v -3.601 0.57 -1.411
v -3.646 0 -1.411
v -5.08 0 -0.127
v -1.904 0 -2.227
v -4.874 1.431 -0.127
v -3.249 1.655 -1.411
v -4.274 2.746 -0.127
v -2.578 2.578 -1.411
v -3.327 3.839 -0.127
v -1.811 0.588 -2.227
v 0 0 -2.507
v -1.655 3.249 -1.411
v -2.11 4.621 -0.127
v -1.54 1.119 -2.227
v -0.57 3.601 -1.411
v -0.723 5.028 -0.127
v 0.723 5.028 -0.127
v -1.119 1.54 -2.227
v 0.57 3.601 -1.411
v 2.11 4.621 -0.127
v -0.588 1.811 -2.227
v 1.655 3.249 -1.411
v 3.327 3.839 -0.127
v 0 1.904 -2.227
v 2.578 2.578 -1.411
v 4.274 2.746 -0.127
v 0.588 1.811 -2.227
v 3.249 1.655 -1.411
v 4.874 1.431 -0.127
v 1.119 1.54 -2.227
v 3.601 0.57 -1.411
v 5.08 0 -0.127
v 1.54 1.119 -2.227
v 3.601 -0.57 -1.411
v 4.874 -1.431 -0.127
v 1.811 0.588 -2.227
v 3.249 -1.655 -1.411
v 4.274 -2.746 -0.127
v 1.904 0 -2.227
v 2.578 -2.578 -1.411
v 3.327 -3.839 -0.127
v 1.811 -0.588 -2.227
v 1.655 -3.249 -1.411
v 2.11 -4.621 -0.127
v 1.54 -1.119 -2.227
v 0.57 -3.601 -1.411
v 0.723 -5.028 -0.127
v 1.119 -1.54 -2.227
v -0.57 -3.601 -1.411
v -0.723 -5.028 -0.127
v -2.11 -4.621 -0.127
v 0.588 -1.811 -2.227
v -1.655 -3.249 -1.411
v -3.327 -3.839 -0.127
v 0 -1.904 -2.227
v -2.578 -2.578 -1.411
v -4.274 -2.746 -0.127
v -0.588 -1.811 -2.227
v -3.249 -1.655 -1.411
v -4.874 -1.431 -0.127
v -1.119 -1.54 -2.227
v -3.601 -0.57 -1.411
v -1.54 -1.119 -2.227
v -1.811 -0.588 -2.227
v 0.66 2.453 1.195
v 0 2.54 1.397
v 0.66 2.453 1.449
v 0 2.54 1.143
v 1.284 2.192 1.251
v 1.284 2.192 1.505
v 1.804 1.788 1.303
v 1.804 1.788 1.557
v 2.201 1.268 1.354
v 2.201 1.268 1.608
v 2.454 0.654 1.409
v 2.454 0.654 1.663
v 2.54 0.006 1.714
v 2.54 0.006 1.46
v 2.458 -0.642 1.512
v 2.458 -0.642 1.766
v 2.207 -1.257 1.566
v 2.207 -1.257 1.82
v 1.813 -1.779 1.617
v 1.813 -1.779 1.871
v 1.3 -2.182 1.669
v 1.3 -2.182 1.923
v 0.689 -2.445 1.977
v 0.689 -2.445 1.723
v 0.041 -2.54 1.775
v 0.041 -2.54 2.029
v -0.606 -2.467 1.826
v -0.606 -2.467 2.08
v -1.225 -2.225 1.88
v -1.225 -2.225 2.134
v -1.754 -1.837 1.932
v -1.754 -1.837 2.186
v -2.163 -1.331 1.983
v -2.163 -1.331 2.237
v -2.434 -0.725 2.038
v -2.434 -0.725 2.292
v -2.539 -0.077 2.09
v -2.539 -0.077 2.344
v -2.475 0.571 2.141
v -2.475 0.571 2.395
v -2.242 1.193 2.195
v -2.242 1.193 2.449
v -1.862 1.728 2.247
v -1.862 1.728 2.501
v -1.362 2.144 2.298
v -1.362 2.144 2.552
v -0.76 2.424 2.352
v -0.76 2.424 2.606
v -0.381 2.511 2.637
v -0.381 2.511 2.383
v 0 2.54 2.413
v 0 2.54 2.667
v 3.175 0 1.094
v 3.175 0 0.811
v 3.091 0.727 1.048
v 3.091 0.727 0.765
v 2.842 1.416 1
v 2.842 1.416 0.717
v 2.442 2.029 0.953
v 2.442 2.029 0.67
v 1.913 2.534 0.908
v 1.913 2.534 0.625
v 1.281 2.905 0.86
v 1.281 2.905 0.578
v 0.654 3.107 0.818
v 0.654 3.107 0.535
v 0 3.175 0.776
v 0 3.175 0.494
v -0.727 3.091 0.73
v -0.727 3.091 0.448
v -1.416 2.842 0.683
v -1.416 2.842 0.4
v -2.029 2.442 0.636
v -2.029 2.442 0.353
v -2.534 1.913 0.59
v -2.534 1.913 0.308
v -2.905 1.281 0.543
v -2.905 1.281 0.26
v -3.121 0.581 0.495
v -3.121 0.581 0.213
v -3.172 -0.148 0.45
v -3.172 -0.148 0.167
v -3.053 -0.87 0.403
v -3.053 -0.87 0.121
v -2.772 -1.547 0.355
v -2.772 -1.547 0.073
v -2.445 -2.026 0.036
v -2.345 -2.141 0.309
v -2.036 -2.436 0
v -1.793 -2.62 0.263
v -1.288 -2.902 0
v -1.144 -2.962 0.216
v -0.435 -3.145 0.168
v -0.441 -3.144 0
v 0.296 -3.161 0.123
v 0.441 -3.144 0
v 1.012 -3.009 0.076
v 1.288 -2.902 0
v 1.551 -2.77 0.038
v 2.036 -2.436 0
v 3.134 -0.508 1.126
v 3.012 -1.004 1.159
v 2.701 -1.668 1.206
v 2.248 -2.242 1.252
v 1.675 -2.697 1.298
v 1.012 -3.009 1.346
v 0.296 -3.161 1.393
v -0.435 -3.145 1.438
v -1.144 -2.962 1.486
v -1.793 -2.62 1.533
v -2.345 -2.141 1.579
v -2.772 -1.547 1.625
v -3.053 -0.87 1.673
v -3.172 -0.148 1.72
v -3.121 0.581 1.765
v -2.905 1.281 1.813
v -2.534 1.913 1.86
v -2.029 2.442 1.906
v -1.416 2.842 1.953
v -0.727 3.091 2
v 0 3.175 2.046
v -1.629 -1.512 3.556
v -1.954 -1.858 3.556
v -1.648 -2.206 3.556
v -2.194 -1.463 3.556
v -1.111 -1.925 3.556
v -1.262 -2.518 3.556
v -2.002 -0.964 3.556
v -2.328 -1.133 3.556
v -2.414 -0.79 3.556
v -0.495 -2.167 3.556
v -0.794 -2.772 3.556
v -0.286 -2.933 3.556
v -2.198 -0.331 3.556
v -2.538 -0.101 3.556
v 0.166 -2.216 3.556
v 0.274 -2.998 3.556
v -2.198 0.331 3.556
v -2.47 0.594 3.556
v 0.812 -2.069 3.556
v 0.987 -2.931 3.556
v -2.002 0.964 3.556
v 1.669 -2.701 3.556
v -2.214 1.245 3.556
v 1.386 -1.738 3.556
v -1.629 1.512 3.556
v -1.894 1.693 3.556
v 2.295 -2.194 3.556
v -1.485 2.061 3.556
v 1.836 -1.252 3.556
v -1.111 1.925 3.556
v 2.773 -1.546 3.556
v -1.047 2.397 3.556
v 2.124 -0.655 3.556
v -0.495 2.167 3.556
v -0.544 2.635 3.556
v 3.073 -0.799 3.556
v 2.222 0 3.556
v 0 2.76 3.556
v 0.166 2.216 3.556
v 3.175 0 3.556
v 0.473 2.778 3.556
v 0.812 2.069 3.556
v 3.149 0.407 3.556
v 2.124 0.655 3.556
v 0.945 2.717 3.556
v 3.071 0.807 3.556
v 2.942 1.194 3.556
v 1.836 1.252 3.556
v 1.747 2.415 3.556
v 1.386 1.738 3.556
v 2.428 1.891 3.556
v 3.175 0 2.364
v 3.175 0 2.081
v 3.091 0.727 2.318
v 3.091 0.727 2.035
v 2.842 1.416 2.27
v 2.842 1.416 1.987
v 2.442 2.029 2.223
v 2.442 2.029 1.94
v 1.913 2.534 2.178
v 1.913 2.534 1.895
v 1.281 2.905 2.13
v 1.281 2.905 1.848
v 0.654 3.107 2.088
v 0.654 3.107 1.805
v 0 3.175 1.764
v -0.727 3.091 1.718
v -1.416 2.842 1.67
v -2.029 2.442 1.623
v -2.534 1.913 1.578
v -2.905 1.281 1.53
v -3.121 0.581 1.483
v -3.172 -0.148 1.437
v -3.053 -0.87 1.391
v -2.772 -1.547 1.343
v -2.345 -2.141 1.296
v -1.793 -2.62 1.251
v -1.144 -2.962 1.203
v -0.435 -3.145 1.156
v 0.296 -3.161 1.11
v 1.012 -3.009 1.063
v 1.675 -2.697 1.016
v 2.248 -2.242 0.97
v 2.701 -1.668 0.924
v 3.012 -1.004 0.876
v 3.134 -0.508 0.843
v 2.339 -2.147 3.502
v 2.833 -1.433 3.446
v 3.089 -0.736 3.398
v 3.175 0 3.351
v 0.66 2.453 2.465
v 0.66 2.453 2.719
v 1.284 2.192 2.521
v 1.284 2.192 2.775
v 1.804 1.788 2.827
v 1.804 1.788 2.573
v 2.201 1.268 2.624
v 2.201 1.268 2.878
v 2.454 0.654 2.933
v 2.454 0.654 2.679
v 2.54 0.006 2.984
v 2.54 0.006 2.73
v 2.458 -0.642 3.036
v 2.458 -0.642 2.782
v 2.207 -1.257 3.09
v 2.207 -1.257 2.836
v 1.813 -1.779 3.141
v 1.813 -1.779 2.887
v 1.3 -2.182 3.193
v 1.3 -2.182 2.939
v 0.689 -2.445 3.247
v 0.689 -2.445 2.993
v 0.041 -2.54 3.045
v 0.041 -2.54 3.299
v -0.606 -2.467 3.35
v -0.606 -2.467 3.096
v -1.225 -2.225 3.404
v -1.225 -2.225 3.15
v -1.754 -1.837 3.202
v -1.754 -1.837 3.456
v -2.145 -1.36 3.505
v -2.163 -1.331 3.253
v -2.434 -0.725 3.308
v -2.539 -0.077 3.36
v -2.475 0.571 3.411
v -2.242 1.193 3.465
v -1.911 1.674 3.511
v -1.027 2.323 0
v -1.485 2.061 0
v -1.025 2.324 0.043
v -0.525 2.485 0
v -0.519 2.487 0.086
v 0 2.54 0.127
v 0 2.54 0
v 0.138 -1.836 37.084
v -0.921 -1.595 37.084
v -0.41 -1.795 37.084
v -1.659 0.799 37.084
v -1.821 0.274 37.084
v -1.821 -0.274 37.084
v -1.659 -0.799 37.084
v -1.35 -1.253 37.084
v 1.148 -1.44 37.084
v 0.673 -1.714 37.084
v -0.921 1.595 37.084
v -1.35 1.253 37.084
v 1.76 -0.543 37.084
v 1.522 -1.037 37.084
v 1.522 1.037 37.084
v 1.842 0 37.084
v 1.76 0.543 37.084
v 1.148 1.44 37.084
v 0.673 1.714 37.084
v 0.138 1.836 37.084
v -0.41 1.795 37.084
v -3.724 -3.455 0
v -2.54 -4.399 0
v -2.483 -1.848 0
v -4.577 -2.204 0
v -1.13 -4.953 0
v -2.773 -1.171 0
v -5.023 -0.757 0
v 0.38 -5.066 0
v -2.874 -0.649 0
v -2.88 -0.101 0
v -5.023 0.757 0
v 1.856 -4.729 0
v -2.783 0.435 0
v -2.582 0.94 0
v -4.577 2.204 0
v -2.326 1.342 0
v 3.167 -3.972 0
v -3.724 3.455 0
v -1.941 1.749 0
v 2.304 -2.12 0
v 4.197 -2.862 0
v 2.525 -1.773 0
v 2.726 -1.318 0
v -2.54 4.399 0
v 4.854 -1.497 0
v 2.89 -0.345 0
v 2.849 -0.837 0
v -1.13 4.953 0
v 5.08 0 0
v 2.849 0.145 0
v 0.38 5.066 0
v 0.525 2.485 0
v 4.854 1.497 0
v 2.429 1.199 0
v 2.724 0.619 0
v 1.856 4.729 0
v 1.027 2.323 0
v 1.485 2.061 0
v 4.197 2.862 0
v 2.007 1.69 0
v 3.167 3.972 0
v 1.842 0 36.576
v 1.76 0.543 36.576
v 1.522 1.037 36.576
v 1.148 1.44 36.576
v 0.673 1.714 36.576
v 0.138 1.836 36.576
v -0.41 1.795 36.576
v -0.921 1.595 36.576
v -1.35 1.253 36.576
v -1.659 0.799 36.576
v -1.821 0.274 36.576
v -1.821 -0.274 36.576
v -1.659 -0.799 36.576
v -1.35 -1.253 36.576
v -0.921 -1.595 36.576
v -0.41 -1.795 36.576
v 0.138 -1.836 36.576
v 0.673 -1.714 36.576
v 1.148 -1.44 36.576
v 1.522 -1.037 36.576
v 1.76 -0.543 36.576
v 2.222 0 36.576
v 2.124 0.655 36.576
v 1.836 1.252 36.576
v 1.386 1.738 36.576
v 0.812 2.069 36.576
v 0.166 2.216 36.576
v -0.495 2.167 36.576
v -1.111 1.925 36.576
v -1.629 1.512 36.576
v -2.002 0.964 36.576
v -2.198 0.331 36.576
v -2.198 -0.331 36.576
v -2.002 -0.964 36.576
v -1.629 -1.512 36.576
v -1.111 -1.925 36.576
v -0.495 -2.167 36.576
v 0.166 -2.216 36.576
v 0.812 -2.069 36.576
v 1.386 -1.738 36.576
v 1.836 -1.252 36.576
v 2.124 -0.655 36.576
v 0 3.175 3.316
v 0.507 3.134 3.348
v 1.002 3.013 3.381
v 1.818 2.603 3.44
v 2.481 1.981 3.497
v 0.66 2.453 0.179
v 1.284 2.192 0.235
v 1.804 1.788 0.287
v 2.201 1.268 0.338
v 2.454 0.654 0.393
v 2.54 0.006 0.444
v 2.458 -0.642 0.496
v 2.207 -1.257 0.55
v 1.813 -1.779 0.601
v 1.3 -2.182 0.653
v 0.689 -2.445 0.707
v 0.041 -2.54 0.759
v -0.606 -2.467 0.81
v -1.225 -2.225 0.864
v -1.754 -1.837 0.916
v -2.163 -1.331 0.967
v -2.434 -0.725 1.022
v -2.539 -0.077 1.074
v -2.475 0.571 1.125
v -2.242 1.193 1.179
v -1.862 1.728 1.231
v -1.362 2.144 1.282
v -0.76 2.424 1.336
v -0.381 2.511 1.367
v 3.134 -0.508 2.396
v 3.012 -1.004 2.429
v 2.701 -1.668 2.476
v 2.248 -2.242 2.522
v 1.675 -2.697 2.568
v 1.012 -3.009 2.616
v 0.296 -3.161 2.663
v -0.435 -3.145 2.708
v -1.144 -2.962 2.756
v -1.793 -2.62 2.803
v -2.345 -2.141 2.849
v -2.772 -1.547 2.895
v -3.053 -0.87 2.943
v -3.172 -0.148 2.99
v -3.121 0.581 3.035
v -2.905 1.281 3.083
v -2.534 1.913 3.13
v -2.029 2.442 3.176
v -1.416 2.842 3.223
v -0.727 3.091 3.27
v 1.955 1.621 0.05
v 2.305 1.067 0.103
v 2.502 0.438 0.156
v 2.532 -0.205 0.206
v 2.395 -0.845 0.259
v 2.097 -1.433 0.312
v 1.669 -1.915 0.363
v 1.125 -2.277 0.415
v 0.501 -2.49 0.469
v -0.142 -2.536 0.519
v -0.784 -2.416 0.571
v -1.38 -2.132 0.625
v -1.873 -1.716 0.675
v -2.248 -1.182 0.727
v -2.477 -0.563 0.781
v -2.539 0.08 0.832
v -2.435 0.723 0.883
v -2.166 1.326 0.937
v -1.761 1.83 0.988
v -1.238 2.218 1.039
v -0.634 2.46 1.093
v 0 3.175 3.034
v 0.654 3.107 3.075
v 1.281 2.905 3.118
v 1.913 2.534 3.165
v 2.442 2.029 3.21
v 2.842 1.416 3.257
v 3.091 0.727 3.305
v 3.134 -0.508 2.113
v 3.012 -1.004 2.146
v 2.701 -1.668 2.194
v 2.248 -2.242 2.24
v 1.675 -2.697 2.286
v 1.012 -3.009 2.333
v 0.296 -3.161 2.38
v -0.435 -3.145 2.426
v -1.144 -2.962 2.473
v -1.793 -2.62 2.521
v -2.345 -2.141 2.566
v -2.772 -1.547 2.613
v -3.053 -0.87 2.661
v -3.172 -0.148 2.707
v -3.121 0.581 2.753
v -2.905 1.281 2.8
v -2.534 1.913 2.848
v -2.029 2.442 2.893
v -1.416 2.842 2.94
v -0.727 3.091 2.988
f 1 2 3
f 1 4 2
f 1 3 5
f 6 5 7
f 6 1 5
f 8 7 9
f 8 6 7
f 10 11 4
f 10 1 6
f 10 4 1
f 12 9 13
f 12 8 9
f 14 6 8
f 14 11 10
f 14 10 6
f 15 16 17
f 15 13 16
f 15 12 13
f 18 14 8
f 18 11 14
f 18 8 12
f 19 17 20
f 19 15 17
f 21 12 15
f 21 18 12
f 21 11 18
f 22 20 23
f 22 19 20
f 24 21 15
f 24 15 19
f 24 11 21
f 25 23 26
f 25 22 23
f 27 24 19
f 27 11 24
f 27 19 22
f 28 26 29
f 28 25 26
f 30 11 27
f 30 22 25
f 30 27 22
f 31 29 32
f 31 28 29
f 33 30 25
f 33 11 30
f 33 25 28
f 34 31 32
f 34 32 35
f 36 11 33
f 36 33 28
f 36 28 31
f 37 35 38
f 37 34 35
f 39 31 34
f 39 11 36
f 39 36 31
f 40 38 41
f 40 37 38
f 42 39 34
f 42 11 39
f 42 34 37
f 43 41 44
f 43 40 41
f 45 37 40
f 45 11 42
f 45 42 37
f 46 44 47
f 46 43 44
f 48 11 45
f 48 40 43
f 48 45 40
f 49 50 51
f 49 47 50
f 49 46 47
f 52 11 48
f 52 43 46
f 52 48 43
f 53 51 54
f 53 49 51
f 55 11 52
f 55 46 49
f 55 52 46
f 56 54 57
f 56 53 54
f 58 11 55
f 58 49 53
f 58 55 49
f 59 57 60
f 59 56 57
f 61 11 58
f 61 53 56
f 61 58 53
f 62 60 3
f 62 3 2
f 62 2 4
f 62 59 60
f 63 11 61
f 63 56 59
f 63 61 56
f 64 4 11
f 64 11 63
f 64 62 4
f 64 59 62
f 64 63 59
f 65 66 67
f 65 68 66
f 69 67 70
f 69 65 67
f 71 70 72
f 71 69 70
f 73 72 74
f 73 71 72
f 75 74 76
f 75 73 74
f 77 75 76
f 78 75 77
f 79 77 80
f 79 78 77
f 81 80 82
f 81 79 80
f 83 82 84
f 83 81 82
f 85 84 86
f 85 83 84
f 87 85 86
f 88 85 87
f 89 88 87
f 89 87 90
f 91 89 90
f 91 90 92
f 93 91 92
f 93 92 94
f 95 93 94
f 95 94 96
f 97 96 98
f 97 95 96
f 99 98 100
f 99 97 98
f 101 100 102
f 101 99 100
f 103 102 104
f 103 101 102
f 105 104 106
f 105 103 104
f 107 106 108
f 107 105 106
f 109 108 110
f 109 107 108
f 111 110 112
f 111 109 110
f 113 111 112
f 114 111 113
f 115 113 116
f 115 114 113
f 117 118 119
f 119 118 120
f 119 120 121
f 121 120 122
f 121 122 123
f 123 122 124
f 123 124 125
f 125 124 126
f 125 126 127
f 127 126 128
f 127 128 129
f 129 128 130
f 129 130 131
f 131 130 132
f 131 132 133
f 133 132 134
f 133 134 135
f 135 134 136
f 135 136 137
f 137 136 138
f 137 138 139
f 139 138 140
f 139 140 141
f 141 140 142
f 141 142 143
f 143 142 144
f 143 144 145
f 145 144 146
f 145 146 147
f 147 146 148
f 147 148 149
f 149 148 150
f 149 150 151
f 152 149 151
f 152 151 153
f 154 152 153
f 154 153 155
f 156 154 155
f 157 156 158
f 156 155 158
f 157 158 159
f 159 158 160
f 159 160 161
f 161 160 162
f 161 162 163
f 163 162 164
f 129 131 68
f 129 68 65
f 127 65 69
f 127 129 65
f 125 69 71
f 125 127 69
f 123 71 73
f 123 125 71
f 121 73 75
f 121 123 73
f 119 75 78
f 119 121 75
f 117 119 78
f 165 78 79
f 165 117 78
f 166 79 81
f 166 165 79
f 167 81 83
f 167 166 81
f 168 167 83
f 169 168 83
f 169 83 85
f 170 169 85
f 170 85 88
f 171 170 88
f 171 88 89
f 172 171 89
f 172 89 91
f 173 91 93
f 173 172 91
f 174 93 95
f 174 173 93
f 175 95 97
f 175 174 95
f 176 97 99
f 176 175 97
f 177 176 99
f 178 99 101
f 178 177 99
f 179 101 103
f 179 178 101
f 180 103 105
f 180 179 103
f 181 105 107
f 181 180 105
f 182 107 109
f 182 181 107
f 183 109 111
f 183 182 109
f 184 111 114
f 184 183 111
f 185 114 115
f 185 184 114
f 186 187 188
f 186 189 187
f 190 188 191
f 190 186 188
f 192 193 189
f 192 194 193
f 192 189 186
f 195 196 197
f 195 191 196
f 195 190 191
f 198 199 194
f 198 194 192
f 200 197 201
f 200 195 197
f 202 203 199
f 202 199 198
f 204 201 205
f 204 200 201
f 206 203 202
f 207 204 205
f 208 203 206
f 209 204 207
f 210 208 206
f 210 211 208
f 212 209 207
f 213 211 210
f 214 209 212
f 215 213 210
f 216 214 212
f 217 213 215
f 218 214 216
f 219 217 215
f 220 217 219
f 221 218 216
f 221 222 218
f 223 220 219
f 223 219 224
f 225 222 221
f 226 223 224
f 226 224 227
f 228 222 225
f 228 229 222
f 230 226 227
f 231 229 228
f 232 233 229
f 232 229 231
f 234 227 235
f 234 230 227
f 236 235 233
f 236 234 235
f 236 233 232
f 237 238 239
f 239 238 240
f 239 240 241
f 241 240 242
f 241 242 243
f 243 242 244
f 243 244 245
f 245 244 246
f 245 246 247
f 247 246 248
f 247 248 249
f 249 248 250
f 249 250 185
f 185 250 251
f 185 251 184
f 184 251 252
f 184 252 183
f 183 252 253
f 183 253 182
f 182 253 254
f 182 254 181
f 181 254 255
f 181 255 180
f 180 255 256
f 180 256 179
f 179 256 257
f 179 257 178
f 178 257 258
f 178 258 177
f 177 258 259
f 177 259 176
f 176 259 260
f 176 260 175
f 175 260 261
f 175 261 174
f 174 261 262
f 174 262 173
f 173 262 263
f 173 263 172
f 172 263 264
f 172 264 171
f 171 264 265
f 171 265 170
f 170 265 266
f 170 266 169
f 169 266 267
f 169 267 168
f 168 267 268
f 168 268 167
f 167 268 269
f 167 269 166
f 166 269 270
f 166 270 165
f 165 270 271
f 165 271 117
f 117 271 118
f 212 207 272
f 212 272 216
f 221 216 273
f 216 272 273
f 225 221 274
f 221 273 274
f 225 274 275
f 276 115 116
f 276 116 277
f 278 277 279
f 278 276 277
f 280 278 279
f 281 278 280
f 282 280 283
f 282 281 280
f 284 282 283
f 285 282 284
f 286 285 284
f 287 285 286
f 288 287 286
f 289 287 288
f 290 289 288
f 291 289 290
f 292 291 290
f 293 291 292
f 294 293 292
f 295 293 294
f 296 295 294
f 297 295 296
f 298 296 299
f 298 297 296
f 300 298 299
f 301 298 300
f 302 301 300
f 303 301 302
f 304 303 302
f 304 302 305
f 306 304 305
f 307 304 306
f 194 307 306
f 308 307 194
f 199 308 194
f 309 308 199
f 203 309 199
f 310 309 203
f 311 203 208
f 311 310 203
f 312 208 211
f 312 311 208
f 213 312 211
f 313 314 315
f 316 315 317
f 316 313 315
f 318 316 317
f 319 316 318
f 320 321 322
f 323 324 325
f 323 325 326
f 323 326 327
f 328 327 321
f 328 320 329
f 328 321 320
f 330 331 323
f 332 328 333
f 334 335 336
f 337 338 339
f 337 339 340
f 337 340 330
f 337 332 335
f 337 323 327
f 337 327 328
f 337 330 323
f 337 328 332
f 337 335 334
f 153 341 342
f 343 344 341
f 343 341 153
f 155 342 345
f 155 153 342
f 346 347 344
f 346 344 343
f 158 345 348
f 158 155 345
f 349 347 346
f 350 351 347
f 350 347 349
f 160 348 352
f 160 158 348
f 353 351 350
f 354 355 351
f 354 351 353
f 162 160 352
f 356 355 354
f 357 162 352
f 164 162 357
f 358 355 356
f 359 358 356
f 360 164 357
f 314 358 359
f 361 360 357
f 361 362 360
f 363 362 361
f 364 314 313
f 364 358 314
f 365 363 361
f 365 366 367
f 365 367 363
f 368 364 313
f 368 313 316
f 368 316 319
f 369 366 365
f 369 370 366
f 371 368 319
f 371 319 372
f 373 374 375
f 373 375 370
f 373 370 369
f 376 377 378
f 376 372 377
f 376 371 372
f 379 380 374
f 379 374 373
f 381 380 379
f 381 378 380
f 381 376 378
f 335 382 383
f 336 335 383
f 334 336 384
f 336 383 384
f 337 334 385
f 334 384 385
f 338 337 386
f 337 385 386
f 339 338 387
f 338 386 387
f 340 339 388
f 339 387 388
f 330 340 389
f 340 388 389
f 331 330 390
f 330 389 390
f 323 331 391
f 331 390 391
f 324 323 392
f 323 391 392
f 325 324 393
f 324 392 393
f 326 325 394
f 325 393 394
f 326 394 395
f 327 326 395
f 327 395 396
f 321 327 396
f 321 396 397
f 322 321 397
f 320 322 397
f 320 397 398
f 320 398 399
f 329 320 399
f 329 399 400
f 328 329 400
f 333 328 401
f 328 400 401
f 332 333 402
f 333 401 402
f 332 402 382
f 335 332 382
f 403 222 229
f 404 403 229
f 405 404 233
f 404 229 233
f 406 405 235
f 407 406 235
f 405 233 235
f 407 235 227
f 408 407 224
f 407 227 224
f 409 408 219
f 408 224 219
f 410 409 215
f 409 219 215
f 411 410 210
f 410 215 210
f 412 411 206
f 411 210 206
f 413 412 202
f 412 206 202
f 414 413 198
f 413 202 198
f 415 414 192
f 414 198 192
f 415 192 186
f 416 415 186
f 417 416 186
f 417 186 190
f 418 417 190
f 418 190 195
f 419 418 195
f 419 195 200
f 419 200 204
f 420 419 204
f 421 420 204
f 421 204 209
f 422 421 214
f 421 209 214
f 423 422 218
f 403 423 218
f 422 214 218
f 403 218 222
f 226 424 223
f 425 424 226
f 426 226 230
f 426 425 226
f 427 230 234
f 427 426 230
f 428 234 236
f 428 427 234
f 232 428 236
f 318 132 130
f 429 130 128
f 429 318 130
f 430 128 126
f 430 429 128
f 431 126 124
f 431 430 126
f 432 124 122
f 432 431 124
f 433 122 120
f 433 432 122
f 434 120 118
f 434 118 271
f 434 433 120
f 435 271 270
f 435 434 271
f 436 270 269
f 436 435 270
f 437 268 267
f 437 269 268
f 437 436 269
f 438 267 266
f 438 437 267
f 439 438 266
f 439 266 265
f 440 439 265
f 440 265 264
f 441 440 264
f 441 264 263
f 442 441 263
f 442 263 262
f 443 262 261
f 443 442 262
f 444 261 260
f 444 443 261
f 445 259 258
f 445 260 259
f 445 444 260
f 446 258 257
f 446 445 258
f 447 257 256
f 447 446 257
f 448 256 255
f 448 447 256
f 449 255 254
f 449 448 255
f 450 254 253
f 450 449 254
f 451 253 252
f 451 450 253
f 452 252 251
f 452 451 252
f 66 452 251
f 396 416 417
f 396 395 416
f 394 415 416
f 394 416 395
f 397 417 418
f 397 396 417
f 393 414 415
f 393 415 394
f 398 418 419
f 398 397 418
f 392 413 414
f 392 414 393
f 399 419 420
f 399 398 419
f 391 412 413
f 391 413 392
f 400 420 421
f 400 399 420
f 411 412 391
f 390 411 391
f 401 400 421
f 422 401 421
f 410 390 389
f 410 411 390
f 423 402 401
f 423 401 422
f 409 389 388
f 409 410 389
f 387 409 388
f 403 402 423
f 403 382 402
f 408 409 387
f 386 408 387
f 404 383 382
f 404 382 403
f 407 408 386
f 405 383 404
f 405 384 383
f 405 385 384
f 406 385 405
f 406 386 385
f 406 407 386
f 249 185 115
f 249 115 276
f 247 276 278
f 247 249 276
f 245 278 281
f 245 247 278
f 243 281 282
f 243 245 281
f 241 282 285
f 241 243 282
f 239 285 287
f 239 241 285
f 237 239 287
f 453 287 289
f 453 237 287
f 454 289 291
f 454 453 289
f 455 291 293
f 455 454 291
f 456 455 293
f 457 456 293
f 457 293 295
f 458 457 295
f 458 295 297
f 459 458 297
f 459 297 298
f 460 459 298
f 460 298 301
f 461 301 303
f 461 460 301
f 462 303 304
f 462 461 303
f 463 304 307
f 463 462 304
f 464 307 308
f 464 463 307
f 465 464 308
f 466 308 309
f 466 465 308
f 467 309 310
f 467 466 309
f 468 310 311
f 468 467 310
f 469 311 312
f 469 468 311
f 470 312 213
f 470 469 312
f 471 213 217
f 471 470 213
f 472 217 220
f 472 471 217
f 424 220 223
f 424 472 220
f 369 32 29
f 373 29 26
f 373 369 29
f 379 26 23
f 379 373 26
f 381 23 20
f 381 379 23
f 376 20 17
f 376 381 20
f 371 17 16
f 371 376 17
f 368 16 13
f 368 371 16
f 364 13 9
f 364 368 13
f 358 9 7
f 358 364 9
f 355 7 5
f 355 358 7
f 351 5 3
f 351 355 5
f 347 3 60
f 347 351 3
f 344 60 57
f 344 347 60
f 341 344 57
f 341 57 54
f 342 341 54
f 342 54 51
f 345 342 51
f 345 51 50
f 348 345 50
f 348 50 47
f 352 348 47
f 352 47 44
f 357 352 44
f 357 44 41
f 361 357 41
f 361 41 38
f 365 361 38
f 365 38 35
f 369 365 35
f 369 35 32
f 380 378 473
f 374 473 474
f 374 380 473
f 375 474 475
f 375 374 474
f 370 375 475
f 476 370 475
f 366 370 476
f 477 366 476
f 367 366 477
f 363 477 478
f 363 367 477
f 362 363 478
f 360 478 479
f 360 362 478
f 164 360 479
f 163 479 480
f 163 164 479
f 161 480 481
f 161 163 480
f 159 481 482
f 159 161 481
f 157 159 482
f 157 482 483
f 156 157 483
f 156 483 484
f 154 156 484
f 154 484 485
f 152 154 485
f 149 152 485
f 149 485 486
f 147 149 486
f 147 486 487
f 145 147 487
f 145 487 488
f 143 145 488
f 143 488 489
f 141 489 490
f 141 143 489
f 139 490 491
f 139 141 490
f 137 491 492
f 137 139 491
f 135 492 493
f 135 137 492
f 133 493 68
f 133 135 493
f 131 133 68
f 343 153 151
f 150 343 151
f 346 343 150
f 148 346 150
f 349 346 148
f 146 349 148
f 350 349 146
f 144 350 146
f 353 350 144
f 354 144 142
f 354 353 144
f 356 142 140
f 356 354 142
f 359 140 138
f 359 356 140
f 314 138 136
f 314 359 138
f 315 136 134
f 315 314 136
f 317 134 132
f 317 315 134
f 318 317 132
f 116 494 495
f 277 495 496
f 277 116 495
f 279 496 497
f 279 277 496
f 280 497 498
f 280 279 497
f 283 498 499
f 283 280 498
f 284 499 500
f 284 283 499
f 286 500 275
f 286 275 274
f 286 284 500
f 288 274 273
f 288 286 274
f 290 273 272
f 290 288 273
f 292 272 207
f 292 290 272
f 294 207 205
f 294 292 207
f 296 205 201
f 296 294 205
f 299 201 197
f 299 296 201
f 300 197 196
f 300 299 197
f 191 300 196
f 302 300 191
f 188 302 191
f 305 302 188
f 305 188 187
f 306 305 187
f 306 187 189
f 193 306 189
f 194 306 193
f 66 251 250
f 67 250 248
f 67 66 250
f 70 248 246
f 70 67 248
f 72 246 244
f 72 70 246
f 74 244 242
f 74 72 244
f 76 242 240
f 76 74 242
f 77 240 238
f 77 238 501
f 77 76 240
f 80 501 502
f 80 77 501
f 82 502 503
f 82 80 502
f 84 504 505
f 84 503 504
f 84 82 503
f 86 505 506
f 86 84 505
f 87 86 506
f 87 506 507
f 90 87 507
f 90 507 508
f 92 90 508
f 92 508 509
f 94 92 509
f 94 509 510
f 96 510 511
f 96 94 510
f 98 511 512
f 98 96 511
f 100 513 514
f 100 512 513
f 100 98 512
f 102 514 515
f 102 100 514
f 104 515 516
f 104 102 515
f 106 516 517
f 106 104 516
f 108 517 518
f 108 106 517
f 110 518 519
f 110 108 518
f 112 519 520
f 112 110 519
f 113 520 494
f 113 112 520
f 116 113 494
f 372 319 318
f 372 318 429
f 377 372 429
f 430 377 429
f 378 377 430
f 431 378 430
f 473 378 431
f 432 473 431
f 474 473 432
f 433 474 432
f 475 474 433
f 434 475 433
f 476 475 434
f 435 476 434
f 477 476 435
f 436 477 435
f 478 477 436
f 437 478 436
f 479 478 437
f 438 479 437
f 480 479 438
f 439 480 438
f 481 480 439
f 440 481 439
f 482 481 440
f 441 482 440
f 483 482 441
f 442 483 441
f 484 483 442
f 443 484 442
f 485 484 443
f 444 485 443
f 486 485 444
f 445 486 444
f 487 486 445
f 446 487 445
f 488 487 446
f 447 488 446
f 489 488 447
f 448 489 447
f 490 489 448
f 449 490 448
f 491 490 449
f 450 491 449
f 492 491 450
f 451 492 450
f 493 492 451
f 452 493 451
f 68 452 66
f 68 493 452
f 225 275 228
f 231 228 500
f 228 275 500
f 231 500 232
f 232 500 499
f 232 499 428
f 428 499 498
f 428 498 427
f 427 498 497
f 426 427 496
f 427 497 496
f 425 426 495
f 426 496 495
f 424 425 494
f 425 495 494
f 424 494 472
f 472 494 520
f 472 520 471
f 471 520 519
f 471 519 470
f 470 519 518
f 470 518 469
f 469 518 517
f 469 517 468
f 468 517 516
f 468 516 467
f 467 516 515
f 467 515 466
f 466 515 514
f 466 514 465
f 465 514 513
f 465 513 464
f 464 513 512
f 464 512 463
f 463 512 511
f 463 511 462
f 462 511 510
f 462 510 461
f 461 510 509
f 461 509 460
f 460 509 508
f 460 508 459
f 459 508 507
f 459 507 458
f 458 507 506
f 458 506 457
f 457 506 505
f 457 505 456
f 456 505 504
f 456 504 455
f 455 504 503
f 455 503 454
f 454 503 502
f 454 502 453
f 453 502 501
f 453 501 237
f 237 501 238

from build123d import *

# Parameters (mm, degrees)
SKETCH3_R           = 3.175
BOSS_EXTRUDE1_DEPTH = 3.556
CUT_SWEEP1_PITCH    = 1.27
SKETCH10_R          = 2.2225
BOSS_EXTRUDE5_DEPTH = 33.02
SKETCH9_R           = 5.08
BOSS_EXTRUDE4_DEPTH = 0.127
DOME3_FACE_RADIUS   = 5.08
DOME3_HEIGHT        = 2.38
SKETCH11_R          = 1.8415
BOSS_EXTRUDE6_DEPTH = 0.508


with BuildPart() as part:
    # Sketch3 → Boss-Extrude1 (new body)
    with BuildSketch(Plane.XY):
        Circle(SKETCH3_R)
    extrude(amount=BOSS_EXTRUDE1_DEPTH)

    # Cut-Sweep1: arcs per turn and ends read off the stored shape
    # Cut-Sweep1: the profile of Sketch5 profile screwed along a left-hand helix through 5 turns, 8 arcs to a turn; built about Z, then put on its axis
    cut_sweep1_z = Axis((0, 0, 0), (0, 0, 1))
    cut_sweep1_corners = [(2.54, 0, -1.397), (3.1753, 0, -1.763790626), (3.1753, 0, -0.776209374), (2.54, 0, -1.143)]
    with BuildLine(mode=Mode.PRIVATE) as cut_sweep1_profile:
        Line(cut_sweep1_corners[0], cut_sweep1_corners[1])
        Line(cut_sweep1_corners[1], cut_sweep1_corners[2])
        Line(cut_sweep1_corners[2], cut_sweep1_corners[3])
        Line(cut_sweep1_corners[3], cut_sweep1_corners[0])
    cut_sweep1_cap = Face(cut_sweep1_profile.wire())
    cut_sweep1_turn_angles = [0, -22.5, -45, -67.5, -90, -112.5, -135, -157.5, -180, -202.5, -225, -247.5, -270, -292.5, -315, -337.5, -360]
    cut_sweep1_turn_weights = [1, 0.9238795325112867, 1, 0.9238795325112867, 1, 0.9238795325112867, 1, 0.9238795325112867, 1, 0.9238795325112867, 1, 0.9238795325112867, 1, 0.9238795325112867, 1, 0.9238795325112867, 1]
    cut_sweep1_turn_rails = [Edge.make_bspline([Vector(p[0], p[1], 0).rotate(cut_sweep1_z, cut_sweep1_turn_angles[k]) / cut_sweep1_turn_weights[k] + Vector(0, 0, p[2] + -CUT_SWEEP1_PITCH * cut_sweep1_turn_angles[k] / 360) for k in range(17)], [0, 0, 0, 1, 1, 2, 2, 3, 3, 4, 4, 5, 5, 6, 6, 7, 7, 8, 8, 8], 2, cut_sweep1_turn_weights) for p in cut_sweep1_corners]
    cut_sweep1_turn_sides = [Face.make_surface_from_curves(cut_sweep1_turn_rails[p[0]], cut_sweep1_turn_rails[p[1]]) for p in [(0, 1), (1, 2), (2, 3), (3, 0)]]
    cut_sweep1 = Plane(origin=(0, 0, 0), x_dir=(0, 1, 0), z_dir=(0, 0, 1)) * Solid(Shell([*[p.moved(Location((0, 0, CUT_SWEEP1_PITCH * i))) for i in range(5) for p in cut_sweep1_turn_sides], cut_sweep1_cap, cut_sweep1_cap.rotate(cut_sweep1_z, -1800).moved(Location((0, 0, -CUT_SWEEP1_PITCH * -1800 / 360)))]))
    add(cut_sweep1, mode=Mode.SUBTRACT)

    # Sketch10 → Boss-Extrude5 (add)
    with BuildSketch(Plane.XY.offset(3.556)):
        Circle(SKETCH10_R)
    extrude(amount=BOSS_EXTRUDE5_DEPTH)

    # Sketch9 → Boss-Extrude4 (add)
    with BuildSketch(Plane.XY):
        Circle(SKETCH9_R)
    extrude(amount=-BOSS_EXTRUDE4_DEPTH)

    # Dome3: a dome of height H over a round flat face of radius A is a cap of a sphere of radius (A * A + H * H) / (2 * H)
    dome3_r = (DOME3_FACE_RADIUS * DOME3_FACE_RADIUS + DOME3_HEIGHT * DOME3_HEIGHT) / (2 * DOME3_HEIGHT)
    dome3_base = Plane((0, 0, -0.127), z_dir=(0, 0, -1))
    with Locations(dome3_base.offset(DOME3_HEIGHT - dome3_r)):
        dome3_ball = Sphere(dome3_r, mode=Mode.PRIVATE)
    add(split(dome3_ball, bisect_by=dome3_base, keep=Keep.TOP, mode=Mode.PRIVATE))

    # Sketch11 → Boss-Extrude6 (add)
    with BuildSketch(Plane.XY.offset(36.576)):
        Circle(SKETCH11_R)
    extrude(amount=BOSS_EXTRUDE6_DEPTH)


solid = part.part
